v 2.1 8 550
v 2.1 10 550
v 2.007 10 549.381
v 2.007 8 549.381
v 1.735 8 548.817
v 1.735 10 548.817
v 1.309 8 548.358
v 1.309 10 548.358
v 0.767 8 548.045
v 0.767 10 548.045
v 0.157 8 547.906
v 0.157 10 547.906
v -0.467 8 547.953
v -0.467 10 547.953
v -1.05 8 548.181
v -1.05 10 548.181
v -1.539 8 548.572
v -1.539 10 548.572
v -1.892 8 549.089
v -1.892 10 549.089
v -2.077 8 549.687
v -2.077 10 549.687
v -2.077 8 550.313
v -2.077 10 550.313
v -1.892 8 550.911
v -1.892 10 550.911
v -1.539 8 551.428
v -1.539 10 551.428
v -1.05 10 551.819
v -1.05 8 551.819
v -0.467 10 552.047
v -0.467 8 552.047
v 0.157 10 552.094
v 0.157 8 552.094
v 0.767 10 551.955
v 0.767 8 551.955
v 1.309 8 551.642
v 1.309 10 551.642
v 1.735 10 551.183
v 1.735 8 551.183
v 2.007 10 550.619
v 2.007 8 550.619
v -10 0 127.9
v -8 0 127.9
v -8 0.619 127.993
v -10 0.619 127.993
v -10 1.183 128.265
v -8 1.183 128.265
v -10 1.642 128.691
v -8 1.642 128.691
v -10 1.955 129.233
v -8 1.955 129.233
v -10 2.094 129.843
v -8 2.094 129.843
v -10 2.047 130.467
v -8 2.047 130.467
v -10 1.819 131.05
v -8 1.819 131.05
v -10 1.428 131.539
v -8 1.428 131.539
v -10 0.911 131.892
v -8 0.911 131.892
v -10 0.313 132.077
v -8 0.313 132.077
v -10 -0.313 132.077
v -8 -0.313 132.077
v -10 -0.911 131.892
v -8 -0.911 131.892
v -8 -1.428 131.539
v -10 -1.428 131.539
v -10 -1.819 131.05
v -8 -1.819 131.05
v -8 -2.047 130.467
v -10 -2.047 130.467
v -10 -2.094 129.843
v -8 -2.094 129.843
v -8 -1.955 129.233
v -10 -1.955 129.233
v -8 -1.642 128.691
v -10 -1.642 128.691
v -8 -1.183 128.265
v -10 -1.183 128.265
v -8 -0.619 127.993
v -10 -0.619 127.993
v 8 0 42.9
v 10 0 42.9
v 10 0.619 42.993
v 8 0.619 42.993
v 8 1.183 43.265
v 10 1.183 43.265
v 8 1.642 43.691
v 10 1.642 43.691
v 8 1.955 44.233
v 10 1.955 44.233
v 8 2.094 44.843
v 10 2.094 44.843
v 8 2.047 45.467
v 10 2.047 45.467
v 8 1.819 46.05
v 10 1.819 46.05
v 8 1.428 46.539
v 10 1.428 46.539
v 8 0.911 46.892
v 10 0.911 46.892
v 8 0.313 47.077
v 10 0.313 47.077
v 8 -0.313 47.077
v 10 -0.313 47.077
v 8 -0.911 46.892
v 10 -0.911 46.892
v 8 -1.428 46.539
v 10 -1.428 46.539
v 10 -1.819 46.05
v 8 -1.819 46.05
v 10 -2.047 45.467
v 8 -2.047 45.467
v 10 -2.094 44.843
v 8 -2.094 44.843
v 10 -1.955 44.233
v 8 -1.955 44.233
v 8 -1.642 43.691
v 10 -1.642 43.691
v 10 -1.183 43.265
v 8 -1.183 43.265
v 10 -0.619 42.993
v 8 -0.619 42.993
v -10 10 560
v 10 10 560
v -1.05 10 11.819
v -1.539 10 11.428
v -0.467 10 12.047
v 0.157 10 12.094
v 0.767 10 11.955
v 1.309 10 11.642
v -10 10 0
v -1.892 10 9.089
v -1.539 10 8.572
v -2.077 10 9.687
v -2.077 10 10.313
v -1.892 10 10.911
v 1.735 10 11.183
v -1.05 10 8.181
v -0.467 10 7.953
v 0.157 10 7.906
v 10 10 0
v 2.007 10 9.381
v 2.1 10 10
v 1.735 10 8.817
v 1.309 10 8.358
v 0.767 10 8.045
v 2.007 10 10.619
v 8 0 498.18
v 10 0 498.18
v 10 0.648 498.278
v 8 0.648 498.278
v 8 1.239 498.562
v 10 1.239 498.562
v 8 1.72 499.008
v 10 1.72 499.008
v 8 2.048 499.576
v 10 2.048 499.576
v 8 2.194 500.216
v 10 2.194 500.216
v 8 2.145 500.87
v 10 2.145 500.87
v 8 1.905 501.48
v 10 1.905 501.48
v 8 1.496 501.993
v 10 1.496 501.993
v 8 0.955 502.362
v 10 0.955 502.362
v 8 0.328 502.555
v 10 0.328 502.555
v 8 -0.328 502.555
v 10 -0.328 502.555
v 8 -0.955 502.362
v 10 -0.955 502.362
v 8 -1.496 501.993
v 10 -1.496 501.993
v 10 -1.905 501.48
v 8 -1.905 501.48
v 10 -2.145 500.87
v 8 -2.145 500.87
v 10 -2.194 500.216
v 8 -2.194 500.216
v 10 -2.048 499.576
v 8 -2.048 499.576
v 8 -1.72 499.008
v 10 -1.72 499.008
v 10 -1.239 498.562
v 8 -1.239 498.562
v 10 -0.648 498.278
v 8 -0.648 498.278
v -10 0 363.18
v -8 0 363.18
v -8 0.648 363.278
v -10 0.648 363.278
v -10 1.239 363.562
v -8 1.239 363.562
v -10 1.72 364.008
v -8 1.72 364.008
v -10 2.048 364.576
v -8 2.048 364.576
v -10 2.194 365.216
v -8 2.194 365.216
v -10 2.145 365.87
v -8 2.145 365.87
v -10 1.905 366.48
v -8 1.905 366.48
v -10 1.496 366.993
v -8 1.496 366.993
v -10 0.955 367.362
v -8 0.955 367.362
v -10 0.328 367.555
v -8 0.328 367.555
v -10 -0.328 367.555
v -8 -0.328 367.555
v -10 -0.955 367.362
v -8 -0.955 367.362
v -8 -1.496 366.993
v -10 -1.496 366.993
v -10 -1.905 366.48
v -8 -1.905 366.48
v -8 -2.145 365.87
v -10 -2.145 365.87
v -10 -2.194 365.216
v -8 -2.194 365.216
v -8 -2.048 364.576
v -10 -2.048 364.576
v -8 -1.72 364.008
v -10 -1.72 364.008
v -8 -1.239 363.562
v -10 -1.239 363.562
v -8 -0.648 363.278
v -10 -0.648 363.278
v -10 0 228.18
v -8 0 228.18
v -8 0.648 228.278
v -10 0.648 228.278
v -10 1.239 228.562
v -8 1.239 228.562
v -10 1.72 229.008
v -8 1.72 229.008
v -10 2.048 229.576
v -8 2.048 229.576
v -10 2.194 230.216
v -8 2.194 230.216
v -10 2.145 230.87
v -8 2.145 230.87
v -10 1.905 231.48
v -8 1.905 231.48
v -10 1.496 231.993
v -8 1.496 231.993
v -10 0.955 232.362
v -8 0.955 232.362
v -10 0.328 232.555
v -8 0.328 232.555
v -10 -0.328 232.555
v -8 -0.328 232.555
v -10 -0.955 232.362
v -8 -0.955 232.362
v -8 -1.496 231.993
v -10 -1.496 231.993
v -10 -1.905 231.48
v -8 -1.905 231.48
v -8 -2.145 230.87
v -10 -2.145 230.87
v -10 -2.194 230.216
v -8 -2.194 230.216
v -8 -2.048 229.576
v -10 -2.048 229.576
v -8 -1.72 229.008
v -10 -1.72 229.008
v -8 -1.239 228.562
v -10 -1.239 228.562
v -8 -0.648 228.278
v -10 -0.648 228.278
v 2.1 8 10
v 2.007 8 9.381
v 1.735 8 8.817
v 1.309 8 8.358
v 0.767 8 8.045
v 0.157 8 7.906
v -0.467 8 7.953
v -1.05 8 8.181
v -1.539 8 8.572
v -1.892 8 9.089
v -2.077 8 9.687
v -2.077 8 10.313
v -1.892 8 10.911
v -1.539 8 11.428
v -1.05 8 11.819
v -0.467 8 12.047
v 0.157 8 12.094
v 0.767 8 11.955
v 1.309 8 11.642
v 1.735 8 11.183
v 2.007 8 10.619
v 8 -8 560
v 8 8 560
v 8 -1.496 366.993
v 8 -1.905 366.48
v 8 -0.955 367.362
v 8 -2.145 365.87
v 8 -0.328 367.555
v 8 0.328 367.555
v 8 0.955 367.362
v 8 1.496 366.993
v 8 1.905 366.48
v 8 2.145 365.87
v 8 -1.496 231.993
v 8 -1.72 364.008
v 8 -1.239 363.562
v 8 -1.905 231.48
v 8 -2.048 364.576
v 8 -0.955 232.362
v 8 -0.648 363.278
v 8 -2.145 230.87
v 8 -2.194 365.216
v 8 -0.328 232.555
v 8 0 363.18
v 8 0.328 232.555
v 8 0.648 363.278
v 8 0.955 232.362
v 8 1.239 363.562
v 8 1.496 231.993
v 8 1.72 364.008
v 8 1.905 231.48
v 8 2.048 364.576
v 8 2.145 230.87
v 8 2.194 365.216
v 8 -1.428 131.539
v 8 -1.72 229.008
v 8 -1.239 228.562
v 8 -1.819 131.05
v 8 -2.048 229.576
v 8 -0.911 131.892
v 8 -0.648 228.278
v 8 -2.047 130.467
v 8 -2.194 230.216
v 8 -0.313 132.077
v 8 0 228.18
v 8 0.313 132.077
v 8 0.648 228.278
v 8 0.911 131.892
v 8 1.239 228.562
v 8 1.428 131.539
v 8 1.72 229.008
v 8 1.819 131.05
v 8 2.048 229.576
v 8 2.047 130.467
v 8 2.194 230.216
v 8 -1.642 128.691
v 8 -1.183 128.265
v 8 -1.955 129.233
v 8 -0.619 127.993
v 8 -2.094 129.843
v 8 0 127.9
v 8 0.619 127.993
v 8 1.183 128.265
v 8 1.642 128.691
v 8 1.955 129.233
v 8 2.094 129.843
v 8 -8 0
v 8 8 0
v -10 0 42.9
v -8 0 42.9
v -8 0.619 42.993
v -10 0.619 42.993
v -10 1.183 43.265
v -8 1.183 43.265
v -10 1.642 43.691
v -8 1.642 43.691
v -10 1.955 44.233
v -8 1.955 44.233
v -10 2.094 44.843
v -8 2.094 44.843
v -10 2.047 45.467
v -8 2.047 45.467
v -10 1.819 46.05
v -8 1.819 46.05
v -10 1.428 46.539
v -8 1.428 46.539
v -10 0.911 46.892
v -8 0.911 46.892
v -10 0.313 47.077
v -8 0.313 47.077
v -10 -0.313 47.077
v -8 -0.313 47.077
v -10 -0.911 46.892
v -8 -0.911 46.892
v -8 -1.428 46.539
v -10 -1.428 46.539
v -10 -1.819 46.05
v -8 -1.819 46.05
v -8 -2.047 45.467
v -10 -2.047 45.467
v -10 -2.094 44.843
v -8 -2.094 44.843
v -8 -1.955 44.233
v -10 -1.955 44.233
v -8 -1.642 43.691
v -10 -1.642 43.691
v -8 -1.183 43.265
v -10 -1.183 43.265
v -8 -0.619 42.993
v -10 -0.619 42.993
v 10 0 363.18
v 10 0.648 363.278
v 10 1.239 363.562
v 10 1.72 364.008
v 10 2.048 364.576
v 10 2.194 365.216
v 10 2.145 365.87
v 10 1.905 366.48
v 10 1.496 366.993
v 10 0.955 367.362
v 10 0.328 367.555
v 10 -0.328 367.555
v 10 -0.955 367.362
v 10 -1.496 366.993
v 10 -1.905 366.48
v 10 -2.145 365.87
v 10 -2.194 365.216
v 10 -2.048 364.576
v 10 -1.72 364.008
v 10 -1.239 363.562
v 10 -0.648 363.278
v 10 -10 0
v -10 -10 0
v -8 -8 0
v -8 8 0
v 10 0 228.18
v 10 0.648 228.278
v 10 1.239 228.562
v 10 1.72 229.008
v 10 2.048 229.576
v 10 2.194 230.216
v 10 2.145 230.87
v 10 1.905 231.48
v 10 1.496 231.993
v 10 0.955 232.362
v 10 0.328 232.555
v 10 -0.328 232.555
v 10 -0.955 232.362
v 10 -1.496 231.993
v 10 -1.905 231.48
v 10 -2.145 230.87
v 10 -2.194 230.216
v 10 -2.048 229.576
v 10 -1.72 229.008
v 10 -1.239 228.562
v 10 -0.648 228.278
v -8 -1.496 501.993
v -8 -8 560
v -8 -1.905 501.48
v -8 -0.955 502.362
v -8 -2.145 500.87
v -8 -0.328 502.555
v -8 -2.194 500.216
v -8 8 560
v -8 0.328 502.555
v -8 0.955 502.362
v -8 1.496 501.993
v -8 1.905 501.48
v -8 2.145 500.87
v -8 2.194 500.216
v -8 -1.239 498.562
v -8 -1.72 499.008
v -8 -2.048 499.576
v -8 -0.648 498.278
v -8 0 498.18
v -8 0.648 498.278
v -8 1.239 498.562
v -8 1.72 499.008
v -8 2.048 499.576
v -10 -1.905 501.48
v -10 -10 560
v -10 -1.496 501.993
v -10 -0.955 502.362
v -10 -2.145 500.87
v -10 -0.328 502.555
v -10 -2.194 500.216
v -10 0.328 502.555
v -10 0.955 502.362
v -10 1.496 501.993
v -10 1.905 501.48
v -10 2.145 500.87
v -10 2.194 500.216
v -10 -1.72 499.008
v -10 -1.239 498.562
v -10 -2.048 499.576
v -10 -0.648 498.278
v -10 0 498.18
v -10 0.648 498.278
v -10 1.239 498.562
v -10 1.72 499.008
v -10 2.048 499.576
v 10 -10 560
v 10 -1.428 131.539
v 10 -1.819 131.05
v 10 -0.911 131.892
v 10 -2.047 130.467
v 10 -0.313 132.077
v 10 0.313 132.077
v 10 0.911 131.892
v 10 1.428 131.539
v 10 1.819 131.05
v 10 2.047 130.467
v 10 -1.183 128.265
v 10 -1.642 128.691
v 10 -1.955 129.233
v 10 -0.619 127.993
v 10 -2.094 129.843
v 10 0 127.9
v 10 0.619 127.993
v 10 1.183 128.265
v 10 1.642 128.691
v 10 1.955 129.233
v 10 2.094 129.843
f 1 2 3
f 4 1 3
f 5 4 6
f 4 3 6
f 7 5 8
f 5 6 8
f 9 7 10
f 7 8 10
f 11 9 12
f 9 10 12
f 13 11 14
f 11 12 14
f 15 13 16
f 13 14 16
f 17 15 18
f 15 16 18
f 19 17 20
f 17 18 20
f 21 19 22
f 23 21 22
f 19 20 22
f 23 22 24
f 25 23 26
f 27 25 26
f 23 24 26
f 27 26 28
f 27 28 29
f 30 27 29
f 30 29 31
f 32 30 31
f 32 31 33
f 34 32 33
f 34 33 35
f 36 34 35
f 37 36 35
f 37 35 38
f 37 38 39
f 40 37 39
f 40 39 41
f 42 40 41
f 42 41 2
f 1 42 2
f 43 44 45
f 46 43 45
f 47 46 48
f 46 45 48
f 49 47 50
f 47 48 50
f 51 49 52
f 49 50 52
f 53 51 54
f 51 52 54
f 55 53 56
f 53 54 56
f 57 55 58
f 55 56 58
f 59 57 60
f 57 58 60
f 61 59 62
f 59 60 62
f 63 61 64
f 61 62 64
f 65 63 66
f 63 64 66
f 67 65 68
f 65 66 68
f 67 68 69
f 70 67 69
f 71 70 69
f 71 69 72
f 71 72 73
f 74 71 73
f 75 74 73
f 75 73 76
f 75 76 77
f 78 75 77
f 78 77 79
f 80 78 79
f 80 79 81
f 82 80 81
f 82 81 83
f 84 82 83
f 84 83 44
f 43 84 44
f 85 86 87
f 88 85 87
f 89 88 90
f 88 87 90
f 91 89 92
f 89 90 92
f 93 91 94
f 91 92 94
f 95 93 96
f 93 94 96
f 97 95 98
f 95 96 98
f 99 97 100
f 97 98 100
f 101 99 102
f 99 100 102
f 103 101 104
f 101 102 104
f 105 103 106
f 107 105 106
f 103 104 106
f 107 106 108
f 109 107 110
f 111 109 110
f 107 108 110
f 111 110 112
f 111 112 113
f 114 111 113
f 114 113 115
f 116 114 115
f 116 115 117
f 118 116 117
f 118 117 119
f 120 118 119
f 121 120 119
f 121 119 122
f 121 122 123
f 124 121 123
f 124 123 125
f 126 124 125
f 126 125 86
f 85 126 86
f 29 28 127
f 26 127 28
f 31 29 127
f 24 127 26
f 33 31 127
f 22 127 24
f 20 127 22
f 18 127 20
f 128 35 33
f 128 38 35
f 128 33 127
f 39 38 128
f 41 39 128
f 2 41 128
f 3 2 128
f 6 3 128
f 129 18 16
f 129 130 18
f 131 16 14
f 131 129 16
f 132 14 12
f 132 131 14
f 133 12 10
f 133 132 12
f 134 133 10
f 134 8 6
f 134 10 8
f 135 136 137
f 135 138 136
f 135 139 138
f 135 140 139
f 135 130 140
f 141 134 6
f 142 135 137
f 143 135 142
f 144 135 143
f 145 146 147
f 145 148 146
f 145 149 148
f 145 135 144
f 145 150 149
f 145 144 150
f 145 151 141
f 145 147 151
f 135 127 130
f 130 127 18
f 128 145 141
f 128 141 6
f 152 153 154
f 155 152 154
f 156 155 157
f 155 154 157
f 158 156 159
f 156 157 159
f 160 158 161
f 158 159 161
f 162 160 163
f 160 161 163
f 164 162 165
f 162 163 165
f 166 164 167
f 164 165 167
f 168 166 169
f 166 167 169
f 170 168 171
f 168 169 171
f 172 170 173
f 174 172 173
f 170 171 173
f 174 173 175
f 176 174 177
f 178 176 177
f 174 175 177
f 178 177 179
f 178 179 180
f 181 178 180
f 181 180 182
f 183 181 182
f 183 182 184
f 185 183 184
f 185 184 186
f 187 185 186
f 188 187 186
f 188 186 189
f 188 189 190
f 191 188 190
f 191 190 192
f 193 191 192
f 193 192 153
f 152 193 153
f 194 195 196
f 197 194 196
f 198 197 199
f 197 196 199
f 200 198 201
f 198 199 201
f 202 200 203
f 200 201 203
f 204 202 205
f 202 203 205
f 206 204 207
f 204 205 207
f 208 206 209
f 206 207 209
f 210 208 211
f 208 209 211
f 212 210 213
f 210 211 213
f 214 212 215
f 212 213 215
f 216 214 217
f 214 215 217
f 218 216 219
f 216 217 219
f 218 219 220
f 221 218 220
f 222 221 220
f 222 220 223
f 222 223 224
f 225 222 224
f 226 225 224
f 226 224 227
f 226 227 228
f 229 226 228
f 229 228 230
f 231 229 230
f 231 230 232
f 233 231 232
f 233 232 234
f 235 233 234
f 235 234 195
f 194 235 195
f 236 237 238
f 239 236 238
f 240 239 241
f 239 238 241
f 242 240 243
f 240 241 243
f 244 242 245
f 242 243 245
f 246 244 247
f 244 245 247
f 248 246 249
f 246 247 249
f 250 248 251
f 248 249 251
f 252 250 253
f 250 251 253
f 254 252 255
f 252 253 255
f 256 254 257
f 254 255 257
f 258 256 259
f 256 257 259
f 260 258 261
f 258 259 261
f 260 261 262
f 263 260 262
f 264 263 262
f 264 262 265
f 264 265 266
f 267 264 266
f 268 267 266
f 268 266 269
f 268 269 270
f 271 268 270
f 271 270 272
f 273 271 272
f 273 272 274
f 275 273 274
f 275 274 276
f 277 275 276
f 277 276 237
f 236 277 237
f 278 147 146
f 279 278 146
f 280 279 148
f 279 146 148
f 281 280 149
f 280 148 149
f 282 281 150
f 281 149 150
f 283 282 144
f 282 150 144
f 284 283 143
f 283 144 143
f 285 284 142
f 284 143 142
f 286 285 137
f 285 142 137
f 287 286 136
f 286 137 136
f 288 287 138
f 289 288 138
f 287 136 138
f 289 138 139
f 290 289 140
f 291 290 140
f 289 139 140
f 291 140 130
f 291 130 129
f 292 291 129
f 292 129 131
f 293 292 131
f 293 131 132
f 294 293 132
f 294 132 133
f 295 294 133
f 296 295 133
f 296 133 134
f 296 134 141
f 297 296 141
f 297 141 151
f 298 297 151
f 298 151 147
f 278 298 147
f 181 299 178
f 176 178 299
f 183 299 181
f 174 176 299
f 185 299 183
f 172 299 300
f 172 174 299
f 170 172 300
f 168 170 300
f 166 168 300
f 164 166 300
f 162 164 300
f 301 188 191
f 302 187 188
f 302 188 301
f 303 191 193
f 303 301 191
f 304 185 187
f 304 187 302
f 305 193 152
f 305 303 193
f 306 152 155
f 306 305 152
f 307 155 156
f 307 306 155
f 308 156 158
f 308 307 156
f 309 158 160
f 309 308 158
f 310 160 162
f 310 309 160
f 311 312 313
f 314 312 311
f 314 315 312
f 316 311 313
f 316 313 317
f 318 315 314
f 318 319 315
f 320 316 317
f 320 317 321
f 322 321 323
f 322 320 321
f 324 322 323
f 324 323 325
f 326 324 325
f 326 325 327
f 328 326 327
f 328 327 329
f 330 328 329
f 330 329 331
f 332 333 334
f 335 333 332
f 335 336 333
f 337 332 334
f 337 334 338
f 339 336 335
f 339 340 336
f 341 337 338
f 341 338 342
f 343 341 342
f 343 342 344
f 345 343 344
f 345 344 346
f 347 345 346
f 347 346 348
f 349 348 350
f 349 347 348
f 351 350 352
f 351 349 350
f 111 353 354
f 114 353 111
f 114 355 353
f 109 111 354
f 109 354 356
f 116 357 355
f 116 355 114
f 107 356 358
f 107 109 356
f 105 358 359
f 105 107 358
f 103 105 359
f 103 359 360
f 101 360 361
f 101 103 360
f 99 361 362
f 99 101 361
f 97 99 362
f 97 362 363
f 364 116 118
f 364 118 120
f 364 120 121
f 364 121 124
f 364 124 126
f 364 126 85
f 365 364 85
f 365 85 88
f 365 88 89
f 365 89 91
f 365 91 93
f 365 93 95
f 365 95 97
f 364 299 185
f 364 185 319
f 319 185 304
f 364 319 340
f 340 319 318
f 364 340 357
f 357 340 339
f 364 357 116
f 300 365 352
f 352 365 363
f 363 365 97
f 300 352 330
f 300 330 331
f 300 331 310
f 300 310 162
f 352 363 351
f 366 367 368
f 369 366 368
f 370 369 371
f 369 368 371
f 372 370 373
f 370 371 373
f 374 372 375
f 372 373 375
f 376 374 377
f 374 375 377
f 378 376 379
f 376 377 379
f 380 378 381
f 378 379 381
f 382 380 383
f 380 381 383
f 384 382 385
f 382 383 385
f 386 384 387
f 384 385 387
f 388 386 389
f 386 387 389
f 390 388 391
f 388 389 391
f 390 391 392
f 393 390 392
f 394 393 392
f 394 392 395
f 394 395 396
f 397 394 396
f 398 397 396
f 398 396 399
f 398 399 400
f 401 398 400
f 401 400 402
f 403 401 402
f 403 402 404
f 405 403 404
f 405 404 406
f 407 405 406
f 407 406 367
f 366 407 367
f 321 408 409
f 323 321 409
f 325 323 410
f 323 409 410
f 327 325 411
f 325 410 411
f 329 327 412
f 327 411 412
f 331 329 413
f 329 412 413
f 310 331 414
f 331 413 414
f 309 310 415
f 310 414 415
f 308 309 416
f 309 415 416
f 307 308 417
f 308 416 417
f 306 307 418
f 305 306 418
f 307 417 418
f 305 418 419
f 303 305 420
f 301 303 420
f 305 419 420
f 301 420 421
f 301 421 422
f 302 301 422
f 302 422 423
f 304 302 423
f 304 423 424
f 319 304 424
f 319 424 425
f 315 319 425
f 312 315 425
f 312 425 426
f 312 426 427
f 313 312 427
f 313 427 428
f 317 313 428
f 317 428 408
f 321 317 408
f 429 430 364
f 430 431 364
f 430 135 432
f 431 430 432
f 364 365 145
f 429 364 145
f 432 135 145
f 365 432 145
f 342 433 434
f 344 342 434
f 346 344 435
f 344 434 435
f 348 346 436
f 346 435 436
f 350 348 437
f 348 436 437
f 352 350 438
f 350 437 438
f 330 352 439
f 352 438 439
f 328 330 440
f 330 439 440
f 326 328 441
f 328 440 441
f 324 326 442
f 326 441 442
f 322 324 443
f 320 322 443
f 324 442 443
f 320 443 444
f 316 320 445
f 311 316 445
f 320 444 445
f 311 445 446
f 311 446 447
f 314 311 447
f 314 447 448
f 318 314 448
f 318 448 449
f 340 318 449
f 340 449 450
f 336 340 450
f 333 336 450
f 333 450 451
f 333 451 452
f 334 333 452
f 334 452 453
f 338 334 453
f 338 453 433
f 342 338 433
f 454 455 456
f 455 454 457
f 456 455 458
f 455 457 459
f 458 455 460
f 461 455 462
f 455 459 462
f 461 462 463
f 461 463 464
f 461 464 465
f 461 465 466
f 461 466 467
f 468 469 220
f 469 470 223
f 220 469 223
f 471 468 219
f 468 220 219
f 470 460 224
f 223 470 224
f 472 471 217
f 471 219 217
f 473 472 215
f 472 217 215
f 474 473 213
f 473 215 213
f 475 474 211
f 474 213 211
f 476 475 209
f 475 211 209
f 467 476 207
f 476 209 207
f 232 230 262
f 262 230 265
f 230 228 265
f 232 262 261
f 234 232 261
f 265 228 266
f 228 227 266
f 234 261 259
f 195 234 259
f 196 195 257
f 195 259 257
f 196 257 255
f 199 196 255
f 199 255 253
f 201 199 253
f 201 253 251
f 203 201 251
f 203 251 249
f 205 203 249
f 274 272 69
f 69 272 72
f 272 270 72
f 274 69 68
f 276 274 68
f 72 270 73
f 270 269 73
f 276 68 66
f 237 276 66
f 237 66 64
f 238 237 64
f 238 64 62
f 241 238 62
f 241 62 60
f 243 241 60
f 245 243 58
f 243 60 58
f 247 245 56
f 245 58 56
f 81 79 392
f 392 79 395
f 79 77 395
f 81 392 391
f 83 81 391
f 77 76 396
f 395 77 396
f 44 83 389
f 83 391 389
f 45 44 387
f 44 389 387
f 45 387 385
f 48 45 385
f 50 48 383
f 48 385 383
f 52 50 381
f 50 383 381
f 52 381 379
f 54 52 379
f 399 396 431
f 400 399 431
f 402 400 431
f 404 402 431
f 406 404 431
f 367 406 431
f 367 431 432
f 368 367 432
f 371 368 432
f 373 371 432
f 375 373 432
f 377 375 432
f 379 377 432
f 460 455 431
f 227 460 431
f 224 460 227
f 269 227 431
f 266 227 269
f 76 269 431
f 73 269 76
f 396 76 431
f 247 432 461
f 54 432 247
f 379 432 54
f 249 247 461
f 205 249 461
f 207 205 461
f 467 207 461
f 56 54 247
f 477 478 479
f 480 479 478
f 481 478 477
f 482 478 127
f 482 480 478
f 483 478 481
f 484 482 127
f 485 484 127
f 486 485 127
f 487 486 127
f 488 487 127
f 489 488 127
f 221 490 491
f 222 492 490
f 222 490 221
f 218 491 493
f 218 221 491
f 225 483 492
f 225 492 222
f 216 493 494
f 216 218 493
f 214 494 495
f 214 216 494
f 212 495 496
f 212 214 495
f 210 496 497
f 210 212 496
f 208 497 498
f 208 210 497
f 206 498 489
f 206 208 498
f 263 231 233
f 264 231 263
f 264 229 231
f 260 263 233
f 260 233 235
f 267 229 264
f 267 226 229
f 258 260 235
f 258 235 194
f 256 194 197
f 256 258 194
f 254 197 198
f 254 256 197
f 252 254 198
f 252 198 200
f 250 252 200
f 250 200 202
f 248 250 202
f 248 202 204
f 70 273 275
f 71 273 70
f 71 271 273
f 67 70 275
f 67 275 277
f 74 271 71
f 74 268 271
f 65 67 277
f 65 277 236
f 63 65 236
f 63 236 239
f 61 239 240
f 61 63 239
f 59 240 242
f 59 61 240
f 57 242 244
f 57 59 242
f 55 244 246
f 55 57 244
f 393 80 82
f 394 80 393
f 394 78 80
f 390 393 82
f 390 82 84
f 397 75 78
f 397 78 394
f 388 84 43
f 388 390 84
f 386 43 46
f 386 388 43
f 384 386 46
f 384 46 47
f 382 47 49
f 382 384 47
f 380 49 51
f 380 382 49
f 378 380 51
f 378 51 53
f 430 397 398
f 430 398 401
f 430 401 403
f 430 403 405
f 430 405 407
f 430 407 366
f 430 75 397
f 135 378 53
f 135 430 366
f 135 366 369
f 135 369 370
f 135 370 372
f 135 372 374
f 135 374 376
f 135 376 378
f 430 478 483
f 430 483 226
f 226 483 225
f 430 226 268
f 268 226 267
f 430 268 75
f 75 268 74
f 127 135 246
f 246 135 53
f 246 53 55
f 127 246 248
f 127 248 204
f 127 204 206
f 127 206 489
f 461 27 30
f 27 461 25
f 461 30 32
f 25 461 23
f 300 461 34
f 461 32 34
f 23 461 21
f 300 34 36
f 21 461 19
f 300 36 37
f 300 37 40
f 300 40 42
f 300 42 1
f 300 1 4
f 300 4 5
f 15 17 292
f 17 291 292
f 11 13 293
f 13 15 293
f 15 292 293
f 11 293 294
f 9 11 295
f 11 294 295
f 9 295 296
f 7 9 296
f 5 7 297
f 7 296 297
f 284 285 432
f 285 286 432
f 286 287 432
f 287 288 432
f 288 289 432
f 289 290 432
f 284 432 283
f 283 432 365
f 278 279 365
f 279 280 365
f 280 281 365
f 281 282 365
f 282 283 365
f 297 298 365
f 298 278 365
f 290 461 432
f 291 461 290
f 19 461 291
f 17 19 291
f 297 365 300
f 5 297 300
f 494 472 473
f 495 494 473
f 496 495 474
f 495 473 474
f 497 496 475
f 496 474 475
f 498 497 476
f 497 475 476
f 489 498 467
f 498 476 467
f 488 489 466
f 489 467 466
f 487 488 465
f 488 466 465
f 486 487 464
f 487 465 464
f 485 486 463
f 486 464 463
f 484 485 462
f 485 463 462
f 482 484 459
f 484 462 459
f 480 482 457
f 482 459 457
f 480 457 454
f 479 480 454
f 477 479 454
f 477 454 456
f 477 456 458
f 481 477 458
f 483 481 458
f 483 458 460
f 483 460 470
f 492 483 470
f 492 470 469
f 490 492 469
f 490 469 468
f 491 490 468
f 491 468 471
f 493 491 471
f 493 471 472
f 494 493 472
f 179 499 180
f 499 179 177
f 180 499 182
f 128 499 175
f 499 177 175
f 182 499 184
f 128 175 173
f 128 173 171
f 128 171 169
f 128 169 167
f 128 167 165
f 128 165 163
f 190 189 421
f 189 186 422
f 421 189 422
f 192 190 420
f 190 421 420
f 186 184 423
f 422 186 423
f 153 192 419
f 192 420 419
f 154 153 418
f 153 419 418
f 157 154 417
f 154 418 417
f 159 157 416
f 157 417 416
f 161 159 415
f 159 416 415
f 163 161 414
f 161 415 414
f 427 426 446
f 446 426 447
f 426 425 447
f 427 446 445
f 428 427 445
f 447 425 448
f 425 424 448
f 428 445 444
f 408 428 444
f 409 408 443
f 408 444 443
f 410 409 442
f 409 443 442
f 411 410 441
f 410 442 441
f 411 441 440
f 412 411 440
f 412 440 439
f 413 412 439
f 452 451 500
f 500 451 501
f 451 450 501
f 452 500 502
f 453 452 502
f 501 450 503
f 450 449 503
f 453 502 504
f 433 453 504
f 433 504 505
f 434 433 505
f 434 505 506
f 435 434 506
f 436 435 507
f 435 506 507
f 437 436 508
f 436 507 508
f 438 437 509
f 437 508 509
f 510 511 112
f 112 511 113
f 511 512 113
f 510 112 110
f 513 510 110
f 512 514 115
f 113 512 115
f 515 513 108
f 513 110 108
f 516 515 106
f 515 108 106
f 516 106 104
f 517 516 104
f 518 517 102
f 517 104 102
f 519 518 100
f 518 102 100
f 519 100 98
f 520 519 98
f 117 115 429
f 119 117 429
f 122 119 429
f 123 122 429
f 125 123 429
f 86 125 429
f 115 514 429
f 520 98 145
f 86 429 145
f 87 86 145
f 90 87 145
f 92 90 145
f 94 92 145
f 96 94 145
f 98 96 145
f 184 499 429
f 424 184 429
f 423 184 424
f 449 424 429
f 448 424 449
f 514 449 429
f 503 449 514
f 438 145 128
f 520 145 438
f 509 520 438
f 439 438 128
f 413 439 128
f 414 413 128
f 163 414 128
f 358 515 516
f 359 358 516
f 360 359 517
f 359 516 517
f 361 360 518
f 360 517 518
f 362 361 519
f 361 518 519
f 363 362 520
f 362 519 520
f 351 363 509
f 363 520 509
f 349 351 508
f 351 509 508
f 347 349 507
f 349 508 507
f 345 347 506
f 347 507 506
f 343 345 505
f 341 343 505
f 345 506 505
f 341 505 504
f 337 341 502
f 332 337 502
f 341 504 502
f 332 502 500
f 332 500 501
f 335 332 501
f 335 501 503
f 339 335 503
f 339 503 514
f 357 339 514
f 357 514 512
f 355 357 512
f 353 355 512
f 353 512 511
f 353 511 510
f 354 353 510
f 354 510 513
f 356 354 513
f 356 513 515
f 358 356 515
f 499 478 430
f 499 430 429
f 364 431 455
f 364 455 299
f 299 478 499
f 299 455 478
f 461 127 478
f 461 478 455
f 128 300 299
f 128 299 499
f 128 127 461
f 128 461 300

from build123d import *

# Parameters (mm, degrees)
SKETCH_1_W          = 20
SKETCH_1_H          = 20
SKETCH_1_W_2        = 16
SKETCH_1_H_2        = 16
EXTRUDE_1_DEPTH     = 560
SKETCH_2_R          = 2.1
CUT_EXTRUDE_1_DEPTH = 10
SKETCH_4_R          = 2.2
CUT_EXTRUDE_3_DEPTH = 21
SKETCH_5_R          = 2.1
CUT_EXTRUDE_4_DEPTH = 22


with BuildPart() as part:
    # ｽｹｯﾁ1 → ﾎﾞｽ - 押し出し1 (new body)
    with BuildSketch(Plane.XY):
        Rectangle(SKETCH_1_W, SKETCH_1_H)
        Rectangle(SKETCH_1_W_2, SKETCH_1_H_2, mode=Mode.SUBTRACT)
    extrude(amount=EXTRUDE_1_DEPTH)

    # ｽｹｯﾁ2 → ｶｯﾄ - 押し出し1 (cut)
    with BuildSketch(Plane(origin=(0, 10, 0), x_dir=(1, 0, 0), z_dir=(0, 1, 0))):
        with Locations((0, -550)):
            Circle(SKETCH_2_R)
        with Locations((0, -10)):
            Circle(SKETCH_2_R)
    extrude(amount=-CUT_EXTRUDE_1_DEPTH, mode=Mode.SUBTRACT)

    # ｽｹｯﾁ4 → ｶｯﾄ - 押し出し3 (cut, through all)
    with BuildSketch(Plane(origin=(10, 0, 0), x_dir=(0, 0, -1), z_dir=(1, 0, 0))):
        with Locations((-500.38, 0)):
            Circle(SKETCH_4_R)
        with Locations((-365.38, 0)):
            Circle(SKETCH_4_R)
        with Locations((-230.38, 0)):
            Circle(SKETCH_4_R)
    extrude(amount=-CUT_EXTRUDE_3_DEPTH, mode=Mode.SUBTRACT)

    # ｽｹｯﾁ5 → ｶｯﾄ - 押し出し4 (cut)
    with BuildSketch(Plane(origin=(10, 0, 0), x_dir=(0, 0, -1), z_dir=(1, 0, 0))):
        with Locations((-130, 0)):
            Circle(SKETCH_5_R)
        with Locations((-45, 0)):
            Circle(SKETCH_5_R)
    extrude(amount=-CUT_EXTRUDE_4_DEPTH, mode=Mode.SUBTRACT)


solid = part.part
